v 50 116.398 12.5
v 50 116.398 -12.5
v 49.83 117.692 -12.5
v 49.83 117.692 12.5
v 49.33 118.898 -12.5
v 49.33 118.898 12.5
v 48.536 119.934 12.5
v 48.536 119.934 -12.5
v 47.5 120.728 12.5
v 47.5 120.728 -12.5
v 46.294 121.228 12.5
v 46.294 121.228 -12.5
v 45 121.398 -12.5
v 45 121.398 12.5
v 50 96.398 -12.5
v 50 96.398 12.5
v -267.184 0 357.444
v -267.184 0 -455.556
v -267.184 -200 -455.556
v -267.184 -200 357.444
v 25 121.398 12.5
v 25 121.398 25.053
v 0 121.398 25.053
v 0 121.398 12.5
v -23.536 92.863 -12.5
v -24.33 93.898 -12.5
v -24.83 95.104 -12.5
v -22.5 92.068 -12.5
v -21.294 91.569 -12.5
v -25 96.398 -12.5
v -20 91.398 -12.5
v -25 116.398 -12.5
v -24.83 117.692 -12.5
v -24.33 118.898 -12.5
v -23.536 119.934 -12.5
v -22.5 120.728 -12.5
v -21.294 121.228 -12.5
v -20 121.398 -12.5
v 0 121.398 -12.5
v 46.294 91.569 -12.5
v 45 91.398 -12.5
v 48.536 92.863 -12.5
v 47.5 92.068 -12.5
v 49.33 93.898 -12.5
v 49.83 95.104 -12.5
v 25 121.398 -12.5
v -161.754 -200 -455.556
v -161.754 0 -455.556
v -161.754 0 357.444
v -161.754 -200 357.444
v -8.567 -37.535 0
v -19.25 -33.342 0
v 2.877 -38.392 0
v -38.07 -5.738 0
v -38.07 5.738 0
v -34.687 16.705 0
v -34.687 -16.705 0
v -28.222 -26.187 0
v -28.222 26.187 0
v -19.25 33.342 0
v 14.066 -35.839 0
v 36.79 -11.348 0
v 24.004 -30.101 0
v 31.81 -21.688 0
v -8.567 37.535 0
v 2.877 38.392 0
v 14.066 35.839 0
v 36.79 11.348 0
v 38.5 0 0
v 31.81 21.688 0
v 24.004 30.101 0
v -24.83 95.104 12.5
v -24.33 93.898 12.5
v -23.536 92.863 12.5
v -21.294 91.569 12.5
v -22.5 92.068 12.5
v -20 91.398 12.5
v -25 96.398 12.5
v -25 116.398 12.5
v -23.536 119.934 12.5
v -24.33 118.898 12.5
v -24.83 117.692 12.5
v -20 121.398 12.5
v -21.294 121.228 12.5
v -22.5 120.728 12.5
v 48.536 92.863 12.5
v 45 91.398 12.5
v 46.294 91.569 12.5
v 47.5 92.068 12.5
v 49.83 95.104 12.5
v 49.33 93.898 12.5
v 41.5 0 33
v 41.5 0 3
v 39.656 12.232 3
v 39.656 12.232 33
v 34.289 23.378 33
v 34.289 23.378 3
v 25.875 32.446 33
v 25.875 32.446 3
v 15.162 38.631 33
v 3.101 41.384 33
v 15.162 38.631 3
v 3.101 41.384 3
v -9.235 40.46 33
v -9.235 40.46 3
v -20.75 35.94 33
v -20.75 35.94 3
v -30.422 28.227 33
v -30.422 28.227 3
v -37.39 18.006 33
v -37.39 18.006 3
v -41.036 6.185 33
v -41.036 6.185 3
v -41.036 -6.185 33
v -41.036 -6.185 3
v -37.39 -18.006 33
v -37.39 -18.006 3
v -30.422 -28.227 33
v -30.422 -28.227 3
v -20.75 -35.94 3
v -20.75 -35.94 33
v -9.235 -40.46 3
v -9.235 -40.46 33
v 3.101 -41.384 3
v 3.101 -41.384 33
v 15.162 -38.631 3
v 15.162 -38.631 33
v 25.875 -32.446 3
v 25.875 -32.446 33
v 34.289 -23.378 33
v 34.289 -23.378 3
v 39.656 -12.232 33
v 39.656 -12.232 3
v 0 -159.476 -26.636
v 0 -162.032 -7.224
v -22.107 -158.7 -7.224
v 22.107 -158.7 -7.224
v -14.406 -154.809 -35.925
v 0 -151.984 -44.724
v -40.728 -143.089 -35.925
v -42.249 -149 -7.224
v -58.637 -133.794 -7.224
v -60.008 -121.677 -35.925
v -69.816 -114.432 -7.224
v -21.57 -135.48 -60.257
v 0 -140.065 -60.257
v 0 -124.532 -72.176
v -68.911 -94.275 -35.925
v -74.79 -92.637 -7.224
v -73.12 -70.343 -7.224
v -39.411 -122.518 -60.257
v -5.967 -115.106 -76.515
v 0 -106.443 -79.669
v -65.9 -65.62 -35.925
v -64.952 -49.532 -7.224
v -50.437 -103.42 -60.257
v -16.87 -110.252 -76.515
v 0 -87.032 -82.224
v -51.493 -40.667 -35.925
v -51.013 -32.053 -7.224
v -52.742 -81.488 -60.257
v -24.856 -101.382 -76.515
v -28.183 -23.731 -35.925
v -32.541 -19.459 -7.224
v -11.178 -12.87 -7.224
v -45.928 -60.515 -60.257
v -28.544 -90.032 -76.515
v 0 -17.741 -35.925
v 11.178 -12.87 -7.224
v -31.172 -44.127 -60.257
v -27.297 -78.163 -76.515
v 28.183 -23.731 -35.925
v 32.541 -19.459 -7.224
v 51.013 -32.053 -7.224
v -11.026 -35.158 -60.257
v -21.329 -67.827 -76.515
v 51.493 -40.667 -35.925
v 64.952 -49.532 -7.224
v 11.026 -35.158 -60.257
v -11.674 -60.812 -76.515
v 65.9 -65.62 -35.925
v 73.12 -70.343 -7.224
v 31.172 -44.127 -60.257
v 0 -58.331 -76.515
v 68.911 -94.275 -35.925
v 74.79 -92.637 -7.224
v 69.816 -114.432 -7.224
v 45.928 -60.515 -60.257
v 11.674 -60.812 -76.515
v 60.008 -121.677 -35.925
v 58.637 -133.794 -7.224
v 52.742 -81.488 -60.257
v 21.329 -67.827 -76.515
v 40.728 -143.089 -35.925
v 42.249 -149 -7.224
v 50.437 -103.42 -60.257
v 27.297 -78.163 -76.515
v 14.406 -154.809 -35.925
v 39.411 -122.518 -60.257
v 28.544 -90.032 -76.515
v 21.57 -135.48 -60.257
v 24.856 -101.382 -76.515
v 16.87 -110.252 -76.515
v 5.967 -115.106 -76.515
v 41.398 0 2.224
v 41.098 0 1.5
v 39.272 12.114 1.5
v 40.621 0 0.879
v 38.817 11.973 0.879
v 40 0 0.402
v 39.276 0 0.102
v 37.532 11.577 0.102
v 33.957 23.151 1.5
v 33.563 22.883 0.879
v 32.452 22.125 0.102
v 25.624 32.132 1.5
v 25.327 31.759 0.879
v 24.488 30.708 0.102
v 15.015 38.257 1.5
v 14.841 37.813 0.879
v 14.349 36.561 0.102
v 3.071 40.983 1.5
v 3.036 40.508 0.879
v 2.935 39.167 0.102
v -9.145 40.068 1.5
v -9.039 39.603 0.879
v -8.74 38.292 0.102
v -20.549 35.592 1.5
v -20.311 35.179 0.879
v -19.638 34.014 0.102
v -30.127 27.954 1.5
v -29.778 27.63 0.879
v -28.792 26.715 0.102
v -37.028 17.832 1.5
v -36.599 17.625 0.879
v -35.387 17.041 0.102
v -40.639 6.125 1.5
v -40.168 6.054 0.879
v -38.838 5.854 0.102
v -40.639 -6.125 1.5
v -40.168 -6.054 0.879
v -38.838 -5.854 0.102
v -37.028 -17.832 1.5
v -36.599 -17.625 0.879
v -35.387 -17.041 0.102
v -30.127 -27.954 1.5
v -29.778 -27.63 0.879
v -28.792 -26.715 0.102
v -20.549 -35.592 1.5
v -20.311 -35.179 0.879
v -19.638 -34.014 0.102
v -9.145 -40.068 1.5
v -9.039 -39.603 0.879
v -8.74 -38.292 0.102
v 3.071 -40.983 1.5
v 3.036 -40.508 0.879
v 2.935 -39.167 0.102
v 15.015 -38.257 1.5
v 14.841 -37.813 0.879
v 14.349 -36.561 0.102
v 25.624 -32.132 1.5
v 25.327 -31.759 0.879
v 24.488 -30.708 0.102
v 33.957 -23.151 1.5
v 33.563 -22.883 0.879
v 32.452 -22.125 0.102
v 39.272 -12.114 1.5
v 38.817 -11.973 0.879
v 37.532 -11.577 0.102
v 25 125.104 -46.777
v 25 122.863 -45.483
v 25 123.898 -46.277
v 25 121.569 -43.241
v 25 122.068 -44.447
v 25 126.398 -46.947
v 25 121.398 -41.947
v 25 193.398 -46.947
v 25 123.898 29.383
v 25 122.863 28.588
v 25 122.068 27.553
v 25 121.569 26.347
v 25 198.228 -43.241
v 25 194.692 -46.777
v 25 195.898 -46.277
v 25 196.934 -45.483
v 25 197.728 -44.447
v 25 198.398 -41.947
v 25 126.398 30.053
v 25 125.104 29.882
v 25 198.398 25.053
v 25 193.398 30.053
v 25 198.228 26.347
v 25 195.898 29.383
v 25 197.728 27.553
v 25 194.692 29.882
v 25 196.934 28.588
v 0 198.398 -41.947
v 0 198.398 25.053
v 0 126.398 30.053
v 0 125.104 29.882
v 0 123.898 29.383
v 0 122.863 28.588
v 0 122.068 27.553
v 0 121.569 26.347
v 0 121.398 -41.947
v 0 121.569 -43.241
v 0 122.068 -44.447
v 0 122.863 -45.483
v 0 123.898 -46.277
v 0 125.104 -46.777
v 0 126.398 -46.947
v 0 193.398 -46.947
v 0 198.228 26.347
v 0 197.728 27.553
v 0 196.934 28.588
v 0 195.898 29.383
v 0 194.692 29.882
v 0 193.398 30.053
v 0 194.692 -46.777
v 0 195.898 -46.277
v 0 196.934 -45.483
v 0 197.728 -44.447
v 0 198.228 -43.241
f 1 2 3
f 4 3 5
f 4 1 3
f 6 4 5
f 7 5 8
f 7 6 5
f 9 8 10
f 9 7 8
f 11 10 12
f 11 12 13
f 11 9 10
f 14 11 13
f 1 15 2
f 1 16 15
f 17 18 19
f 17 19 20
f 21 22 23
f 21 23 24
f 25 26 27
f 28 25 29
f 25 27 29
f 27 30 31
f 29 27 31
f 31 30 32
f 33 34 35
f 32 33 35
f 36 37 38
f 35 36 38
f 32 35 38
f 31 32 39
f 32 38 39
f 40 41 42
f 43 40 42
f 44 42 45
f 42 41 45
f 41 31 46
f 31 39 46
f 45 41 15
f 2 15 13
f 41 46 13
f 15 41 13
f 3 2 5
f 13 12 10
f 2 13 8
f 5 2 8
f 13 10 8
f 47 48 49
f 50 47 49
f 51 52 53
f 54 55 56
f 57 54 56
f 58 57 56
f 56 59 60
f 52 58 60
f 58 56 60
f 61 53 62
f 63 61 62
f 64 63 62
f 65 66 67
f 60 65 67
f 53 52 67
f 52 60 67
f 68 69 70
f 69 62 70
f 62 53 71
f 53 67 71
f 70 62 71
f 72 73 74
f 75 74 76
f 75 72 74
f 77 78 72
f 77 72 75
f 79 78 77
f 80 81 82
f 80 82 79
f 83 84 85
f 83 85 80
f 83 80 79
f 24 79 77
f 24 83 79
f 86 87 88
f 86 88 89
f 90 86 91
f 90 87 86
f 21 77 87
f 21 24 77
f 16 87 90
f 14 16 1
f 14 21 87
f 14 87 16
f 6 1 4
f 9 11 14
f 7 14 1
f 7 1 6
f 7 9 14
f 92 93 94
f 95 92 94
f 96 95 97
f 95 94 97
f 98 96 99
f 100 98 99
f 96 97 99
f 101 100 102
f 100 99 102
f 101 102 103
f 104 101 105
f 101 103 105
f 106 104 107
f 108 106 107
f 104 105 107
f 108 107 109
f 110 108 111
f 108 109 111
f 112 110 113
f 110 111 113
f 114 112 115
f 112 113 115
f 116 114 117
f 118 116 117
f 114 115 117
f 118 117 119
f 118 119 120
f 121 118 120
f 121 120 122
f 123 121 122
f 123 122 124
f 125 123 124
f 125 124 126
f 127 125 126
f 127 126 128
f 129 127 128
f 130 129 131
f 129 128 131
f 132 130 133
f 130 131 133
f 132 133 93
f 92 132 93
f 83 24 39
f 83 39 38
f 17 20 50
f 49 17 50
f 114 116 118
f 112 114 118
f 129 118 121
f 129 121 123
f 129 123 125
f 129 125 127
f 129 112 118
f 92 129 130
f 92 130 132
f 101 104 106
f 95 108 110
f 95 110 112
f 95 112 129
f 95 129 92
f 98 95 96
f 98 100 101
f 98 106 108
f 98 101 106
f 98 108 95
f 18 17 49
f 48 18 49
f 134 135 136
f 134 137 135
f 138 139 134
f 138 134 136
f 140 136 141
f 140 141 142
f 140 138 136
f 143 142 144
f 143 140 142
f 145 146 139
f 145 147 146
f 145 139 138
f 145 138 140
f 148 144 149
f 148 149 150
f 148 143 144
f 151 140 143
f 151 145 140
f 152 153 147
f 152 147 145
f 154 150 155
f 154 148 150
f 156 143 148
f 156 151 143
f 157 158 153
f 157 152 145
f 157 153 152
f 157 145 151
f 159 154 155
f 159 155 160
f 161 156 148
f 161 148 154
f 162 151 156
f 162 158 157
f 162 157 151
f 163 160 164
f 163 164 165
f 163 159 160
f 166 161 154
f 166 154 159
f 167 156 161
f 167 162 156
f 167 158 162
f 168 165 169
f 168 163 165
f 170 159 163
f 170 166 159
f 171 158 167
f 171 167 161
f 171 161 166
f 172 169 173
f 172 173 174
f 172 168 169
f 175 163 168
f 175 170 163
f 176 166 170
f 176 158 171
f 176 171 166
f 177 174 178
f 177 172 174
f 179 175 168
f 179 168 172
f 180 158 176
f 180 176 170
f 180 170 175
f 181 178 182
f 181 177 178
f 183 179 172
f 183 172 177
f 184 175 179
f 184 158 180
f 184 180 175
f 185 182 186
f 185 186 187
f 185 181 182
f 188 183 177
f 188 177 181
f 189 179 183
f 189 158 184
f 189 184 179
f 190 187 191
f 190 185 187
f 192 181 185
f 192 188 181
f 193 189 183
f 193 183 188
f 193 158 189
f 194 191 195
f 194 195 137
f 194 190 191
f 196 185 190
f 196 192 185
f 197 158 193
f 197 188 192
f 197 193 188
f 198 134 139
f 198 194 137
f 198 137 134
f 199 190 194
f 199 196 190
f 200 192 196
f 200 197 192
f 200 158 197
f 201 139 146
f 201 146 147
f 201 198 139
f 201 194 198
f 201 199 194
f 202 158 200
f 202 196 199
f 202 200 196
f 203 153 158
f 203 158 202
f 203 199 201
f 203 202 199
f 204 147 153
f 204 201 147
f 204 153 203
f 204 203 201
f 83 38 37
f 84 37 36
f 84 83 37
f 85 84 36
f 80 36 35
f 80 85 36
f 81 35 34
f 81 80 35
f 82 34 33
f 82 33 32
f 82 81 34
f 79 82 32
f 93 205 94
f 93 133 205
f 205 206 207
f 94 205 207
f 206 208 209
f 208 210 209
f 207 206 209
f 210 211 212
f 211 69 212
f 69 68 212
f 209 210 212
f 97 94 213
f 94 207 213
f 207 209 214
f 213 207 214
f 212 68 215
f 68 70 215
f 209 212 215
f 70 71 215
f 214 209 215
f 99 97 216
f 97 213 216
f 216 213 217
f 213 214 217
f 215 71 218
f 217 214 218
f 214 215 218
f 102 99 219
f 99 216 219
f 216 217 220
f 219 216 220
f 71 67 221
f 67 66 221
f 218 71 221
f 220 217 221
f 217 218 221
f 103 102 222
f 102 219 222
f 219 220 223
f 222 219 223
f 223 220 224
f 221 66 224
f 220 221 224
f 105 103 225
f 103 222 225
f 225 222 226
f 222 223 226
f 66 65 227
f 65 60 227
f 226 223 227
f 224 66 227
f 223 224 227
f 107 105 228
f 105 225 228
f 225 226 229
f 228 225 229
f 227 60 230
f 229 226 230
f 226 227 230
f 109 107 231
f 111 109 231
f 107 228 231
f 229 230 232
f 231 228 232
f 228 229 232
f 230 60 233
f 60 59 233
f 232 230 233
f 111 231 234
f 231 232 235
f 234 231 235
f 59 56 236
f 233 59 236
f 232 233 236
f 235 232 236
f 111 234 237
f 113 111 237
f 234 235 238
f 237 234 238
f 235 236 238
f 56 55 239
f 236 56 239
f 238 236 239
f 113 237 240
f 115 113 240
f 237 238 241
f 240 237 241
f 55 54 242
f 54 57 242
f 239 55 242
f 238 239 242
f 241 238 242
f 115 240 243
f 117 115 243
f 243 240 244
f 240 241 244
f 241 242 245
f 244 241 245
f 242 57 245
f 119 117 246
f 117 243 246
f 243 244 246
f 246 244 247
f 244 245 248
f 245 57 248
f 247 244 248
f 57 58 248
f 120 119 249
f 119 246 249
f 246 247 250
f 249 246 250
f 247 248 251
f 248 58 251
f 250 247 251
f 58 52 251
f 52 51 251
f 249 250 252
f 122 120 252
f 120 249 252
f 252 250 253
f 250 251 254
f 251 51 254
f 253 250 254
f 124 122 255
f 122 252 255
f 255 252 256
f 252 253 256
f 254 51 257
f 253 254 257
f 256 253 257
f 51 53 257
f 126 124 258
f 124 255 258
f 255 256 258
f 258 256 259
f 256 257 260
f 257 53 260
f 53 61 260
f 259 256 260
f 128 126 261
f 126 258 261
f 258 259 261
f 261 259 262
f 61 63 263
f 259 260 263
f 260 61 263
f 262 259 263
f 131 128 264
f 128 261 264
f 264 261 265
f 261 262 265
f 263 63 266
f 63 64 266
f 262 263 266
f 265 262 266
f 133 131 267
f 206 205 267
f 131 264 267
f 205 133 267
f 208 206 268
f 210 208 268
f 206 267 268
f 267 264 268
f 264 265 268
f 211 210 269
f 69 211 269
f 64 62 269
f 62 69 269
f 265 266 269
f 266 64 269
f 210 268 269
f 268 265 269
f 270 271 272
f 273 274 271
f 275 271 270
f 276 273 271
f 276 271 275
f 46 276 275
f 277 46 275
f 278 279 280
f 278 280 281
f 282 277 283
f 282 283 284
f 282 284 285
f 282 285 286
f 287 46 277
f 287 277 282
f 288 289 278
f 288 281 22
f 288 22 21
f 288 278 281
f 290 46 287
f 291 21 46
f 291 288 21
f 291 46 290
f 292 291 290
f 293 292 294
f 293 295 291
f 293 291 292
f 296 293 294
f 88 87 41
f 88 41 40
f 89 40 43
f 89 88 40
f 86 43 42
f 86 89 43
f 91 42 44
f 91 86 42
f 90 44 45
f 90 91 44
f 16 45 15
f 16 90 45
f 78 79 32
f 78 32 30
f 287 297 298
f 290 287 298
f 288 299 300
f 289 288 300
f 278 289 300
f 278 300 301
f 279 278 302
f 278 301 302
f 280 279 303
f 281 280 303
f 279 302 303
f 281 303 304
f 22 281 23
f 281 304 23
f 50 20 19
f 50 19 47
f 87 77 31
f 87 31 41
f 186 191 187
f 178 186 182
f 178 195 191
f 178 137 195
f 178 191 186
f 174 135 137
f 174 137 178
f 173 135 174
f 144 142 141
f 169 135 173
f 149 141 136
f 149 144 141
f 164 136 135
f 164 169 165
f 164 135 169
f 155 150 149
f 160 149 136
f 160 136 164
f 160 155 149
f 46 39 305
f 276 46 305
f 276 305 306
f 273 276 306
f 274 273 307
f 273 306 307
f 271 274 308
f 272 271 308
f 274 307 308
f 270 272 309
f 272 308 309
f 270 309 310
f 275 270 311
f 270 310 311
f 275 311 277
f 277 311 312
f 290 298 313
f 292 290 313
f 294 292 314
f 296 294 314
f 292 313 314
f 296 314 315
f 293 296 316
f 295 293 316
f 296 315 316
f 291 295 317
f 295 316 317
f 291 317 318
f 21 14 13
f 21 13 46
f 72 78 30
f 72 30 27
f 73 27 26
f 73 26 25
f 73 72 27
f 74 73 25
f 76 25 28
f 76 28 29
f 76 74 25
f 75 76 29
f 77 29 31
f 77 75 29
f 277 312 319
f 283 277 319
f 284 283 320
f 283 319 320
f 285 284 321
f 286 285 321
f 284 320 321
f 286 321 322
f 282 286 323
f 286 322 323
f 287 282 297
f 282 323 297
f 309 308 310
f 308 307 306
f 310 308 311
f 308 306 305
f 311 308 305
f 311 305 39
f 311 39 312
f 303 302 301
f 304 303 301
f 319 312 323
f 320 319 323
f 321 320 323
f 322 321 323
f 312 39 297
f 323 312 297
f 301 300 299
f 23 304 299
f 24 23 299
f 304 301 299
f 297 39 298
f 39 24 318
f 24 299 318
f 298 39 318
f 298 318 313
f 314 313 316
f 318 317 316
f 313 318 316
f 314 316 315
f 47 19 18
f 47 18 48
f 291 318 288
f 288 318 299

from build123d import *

# Parameters (mm, degrees)
F0_R      = 41.5
F1_DEPTH  = 33
F2_R      = 3
F6_DEPTH  = 25
F8_DEPTH  = 12.5
F9_W      = 105.4293025258
F9_H      = 813
F10_DEPTH = 200


with BuildPart() as f1:
    # F0 (on Top) → F1 (new body)
    with BuildSketch(Plane.XY):
        Circle(F0_R)
    extrude(amount=F1_DEPTH)

    # F2
    f2_edges = [f1.edges().sort_by_distance(p)[0] for p in [
        (-41.5, 0, 0),
    ]]
    fillet(f2_edges, radius=F2_R)


with BuildPart() as f4:
    # F3 (on Right) → F4 (revolve)
    with BuildSketch(Plane.YZ):
        with BuildLine():
            Line((-87.0318263769, -7.2241038071), (-162.0318263769, -7.2241038071))
            ThreePointArc((-162.0318263769, -7.2241038071), (-140.0648349659, -60.2571123961), (-87.0318263769, -82.2241038071))
            Line((-87.0318263769, -82.2241038071), (-87.0318263769, -7.2241038071))
        make_face()
    revolve(axis=Axis((0, -87.0318263769, -48.3713962131), (0, 0, -1)))


with BuildPart() as f6:
    # F5 (on Right) → F6 (new body)
    with BuildSketch(Plane.YZ):
        with BuildLine():
            Line((193.3982848227, 30.0528338702), (126.3982848227, 30.0528338702))
            ThreePointArc((126.3982848227, 30.0528338702), (122.8627509168, 28.5883677761), (121.3982848227, 25.0528338702))
            Line((121.3982848227, 25.0528338702), (121.3982848227, -41.9471661298))
            ThreePointArc((121.3982848227, -41.9471661298), (122.8627509168, -45.4827000357), (126.3982848227, -46.9471661298))
            Line((126.3982848227, -46.9471661298), (193.3982848227, -46.9471661298))
            ThreePointArc((193.3982848227, -46.9471661298), (196.9338187286, -45.4827000357), (198.3982848227, -41.9471661298))
            Line((198.3982848227, -41.9471661298), (198.3982848227, 25.0528338702))
            ThreePointArc((198.3982848227, 25.0528338702), (196.9338187286, 28.5883677761), (193.3982848227, 30.0528338702))
        make_face()
    extrude(amount=F6_DEPTH)

    # F7 (on Top) → F8 (join, symmetric)
    with BuildSketch(Plane.XY):
        with BuildLine():
            Line((45, 121.3982848227), (-20, 121.3982848227))
            ThreePointArc((-20, 121.3982848227), (-23.5355339059, 119.9338187286), (-25, 116.3982848227))
            Line((-25, 116.3982848227), (-25, 96.3982848227))
            ThreePointArc((-25, 96.3982848227), (-23.5355339059, 92.8627509168), (-20, 91.3982848227))
            Line((-20, 91.3982848227), (45, 91.3982848227))
            ThreePointArc((45, 91.3982848227), (48.5355339059, 92.8627509168), (50, 96.3982848227))
            Line((50, 96.3982848227), (50, 116.3982848227))
            ThreePointArc((50, 116.3982848227), (48.5355339059, 119.9338187286), (45, 121.3982848227))
        make_face()
    extrude(amount=F8_DEPTH, both=True)


with BuildPart() as f10:
    # F9 (on Front) → F10 (new body)
    with BuildSketch(Plane.XZ):
        with Locations((-214.4689261913, -49.0563139319)):
            Rectangle(F9_W, F9_H)
    extrude(amount=F10_DEPTH)


solid = Compound([f1.part, f4.part, f6.part, f10.part])
